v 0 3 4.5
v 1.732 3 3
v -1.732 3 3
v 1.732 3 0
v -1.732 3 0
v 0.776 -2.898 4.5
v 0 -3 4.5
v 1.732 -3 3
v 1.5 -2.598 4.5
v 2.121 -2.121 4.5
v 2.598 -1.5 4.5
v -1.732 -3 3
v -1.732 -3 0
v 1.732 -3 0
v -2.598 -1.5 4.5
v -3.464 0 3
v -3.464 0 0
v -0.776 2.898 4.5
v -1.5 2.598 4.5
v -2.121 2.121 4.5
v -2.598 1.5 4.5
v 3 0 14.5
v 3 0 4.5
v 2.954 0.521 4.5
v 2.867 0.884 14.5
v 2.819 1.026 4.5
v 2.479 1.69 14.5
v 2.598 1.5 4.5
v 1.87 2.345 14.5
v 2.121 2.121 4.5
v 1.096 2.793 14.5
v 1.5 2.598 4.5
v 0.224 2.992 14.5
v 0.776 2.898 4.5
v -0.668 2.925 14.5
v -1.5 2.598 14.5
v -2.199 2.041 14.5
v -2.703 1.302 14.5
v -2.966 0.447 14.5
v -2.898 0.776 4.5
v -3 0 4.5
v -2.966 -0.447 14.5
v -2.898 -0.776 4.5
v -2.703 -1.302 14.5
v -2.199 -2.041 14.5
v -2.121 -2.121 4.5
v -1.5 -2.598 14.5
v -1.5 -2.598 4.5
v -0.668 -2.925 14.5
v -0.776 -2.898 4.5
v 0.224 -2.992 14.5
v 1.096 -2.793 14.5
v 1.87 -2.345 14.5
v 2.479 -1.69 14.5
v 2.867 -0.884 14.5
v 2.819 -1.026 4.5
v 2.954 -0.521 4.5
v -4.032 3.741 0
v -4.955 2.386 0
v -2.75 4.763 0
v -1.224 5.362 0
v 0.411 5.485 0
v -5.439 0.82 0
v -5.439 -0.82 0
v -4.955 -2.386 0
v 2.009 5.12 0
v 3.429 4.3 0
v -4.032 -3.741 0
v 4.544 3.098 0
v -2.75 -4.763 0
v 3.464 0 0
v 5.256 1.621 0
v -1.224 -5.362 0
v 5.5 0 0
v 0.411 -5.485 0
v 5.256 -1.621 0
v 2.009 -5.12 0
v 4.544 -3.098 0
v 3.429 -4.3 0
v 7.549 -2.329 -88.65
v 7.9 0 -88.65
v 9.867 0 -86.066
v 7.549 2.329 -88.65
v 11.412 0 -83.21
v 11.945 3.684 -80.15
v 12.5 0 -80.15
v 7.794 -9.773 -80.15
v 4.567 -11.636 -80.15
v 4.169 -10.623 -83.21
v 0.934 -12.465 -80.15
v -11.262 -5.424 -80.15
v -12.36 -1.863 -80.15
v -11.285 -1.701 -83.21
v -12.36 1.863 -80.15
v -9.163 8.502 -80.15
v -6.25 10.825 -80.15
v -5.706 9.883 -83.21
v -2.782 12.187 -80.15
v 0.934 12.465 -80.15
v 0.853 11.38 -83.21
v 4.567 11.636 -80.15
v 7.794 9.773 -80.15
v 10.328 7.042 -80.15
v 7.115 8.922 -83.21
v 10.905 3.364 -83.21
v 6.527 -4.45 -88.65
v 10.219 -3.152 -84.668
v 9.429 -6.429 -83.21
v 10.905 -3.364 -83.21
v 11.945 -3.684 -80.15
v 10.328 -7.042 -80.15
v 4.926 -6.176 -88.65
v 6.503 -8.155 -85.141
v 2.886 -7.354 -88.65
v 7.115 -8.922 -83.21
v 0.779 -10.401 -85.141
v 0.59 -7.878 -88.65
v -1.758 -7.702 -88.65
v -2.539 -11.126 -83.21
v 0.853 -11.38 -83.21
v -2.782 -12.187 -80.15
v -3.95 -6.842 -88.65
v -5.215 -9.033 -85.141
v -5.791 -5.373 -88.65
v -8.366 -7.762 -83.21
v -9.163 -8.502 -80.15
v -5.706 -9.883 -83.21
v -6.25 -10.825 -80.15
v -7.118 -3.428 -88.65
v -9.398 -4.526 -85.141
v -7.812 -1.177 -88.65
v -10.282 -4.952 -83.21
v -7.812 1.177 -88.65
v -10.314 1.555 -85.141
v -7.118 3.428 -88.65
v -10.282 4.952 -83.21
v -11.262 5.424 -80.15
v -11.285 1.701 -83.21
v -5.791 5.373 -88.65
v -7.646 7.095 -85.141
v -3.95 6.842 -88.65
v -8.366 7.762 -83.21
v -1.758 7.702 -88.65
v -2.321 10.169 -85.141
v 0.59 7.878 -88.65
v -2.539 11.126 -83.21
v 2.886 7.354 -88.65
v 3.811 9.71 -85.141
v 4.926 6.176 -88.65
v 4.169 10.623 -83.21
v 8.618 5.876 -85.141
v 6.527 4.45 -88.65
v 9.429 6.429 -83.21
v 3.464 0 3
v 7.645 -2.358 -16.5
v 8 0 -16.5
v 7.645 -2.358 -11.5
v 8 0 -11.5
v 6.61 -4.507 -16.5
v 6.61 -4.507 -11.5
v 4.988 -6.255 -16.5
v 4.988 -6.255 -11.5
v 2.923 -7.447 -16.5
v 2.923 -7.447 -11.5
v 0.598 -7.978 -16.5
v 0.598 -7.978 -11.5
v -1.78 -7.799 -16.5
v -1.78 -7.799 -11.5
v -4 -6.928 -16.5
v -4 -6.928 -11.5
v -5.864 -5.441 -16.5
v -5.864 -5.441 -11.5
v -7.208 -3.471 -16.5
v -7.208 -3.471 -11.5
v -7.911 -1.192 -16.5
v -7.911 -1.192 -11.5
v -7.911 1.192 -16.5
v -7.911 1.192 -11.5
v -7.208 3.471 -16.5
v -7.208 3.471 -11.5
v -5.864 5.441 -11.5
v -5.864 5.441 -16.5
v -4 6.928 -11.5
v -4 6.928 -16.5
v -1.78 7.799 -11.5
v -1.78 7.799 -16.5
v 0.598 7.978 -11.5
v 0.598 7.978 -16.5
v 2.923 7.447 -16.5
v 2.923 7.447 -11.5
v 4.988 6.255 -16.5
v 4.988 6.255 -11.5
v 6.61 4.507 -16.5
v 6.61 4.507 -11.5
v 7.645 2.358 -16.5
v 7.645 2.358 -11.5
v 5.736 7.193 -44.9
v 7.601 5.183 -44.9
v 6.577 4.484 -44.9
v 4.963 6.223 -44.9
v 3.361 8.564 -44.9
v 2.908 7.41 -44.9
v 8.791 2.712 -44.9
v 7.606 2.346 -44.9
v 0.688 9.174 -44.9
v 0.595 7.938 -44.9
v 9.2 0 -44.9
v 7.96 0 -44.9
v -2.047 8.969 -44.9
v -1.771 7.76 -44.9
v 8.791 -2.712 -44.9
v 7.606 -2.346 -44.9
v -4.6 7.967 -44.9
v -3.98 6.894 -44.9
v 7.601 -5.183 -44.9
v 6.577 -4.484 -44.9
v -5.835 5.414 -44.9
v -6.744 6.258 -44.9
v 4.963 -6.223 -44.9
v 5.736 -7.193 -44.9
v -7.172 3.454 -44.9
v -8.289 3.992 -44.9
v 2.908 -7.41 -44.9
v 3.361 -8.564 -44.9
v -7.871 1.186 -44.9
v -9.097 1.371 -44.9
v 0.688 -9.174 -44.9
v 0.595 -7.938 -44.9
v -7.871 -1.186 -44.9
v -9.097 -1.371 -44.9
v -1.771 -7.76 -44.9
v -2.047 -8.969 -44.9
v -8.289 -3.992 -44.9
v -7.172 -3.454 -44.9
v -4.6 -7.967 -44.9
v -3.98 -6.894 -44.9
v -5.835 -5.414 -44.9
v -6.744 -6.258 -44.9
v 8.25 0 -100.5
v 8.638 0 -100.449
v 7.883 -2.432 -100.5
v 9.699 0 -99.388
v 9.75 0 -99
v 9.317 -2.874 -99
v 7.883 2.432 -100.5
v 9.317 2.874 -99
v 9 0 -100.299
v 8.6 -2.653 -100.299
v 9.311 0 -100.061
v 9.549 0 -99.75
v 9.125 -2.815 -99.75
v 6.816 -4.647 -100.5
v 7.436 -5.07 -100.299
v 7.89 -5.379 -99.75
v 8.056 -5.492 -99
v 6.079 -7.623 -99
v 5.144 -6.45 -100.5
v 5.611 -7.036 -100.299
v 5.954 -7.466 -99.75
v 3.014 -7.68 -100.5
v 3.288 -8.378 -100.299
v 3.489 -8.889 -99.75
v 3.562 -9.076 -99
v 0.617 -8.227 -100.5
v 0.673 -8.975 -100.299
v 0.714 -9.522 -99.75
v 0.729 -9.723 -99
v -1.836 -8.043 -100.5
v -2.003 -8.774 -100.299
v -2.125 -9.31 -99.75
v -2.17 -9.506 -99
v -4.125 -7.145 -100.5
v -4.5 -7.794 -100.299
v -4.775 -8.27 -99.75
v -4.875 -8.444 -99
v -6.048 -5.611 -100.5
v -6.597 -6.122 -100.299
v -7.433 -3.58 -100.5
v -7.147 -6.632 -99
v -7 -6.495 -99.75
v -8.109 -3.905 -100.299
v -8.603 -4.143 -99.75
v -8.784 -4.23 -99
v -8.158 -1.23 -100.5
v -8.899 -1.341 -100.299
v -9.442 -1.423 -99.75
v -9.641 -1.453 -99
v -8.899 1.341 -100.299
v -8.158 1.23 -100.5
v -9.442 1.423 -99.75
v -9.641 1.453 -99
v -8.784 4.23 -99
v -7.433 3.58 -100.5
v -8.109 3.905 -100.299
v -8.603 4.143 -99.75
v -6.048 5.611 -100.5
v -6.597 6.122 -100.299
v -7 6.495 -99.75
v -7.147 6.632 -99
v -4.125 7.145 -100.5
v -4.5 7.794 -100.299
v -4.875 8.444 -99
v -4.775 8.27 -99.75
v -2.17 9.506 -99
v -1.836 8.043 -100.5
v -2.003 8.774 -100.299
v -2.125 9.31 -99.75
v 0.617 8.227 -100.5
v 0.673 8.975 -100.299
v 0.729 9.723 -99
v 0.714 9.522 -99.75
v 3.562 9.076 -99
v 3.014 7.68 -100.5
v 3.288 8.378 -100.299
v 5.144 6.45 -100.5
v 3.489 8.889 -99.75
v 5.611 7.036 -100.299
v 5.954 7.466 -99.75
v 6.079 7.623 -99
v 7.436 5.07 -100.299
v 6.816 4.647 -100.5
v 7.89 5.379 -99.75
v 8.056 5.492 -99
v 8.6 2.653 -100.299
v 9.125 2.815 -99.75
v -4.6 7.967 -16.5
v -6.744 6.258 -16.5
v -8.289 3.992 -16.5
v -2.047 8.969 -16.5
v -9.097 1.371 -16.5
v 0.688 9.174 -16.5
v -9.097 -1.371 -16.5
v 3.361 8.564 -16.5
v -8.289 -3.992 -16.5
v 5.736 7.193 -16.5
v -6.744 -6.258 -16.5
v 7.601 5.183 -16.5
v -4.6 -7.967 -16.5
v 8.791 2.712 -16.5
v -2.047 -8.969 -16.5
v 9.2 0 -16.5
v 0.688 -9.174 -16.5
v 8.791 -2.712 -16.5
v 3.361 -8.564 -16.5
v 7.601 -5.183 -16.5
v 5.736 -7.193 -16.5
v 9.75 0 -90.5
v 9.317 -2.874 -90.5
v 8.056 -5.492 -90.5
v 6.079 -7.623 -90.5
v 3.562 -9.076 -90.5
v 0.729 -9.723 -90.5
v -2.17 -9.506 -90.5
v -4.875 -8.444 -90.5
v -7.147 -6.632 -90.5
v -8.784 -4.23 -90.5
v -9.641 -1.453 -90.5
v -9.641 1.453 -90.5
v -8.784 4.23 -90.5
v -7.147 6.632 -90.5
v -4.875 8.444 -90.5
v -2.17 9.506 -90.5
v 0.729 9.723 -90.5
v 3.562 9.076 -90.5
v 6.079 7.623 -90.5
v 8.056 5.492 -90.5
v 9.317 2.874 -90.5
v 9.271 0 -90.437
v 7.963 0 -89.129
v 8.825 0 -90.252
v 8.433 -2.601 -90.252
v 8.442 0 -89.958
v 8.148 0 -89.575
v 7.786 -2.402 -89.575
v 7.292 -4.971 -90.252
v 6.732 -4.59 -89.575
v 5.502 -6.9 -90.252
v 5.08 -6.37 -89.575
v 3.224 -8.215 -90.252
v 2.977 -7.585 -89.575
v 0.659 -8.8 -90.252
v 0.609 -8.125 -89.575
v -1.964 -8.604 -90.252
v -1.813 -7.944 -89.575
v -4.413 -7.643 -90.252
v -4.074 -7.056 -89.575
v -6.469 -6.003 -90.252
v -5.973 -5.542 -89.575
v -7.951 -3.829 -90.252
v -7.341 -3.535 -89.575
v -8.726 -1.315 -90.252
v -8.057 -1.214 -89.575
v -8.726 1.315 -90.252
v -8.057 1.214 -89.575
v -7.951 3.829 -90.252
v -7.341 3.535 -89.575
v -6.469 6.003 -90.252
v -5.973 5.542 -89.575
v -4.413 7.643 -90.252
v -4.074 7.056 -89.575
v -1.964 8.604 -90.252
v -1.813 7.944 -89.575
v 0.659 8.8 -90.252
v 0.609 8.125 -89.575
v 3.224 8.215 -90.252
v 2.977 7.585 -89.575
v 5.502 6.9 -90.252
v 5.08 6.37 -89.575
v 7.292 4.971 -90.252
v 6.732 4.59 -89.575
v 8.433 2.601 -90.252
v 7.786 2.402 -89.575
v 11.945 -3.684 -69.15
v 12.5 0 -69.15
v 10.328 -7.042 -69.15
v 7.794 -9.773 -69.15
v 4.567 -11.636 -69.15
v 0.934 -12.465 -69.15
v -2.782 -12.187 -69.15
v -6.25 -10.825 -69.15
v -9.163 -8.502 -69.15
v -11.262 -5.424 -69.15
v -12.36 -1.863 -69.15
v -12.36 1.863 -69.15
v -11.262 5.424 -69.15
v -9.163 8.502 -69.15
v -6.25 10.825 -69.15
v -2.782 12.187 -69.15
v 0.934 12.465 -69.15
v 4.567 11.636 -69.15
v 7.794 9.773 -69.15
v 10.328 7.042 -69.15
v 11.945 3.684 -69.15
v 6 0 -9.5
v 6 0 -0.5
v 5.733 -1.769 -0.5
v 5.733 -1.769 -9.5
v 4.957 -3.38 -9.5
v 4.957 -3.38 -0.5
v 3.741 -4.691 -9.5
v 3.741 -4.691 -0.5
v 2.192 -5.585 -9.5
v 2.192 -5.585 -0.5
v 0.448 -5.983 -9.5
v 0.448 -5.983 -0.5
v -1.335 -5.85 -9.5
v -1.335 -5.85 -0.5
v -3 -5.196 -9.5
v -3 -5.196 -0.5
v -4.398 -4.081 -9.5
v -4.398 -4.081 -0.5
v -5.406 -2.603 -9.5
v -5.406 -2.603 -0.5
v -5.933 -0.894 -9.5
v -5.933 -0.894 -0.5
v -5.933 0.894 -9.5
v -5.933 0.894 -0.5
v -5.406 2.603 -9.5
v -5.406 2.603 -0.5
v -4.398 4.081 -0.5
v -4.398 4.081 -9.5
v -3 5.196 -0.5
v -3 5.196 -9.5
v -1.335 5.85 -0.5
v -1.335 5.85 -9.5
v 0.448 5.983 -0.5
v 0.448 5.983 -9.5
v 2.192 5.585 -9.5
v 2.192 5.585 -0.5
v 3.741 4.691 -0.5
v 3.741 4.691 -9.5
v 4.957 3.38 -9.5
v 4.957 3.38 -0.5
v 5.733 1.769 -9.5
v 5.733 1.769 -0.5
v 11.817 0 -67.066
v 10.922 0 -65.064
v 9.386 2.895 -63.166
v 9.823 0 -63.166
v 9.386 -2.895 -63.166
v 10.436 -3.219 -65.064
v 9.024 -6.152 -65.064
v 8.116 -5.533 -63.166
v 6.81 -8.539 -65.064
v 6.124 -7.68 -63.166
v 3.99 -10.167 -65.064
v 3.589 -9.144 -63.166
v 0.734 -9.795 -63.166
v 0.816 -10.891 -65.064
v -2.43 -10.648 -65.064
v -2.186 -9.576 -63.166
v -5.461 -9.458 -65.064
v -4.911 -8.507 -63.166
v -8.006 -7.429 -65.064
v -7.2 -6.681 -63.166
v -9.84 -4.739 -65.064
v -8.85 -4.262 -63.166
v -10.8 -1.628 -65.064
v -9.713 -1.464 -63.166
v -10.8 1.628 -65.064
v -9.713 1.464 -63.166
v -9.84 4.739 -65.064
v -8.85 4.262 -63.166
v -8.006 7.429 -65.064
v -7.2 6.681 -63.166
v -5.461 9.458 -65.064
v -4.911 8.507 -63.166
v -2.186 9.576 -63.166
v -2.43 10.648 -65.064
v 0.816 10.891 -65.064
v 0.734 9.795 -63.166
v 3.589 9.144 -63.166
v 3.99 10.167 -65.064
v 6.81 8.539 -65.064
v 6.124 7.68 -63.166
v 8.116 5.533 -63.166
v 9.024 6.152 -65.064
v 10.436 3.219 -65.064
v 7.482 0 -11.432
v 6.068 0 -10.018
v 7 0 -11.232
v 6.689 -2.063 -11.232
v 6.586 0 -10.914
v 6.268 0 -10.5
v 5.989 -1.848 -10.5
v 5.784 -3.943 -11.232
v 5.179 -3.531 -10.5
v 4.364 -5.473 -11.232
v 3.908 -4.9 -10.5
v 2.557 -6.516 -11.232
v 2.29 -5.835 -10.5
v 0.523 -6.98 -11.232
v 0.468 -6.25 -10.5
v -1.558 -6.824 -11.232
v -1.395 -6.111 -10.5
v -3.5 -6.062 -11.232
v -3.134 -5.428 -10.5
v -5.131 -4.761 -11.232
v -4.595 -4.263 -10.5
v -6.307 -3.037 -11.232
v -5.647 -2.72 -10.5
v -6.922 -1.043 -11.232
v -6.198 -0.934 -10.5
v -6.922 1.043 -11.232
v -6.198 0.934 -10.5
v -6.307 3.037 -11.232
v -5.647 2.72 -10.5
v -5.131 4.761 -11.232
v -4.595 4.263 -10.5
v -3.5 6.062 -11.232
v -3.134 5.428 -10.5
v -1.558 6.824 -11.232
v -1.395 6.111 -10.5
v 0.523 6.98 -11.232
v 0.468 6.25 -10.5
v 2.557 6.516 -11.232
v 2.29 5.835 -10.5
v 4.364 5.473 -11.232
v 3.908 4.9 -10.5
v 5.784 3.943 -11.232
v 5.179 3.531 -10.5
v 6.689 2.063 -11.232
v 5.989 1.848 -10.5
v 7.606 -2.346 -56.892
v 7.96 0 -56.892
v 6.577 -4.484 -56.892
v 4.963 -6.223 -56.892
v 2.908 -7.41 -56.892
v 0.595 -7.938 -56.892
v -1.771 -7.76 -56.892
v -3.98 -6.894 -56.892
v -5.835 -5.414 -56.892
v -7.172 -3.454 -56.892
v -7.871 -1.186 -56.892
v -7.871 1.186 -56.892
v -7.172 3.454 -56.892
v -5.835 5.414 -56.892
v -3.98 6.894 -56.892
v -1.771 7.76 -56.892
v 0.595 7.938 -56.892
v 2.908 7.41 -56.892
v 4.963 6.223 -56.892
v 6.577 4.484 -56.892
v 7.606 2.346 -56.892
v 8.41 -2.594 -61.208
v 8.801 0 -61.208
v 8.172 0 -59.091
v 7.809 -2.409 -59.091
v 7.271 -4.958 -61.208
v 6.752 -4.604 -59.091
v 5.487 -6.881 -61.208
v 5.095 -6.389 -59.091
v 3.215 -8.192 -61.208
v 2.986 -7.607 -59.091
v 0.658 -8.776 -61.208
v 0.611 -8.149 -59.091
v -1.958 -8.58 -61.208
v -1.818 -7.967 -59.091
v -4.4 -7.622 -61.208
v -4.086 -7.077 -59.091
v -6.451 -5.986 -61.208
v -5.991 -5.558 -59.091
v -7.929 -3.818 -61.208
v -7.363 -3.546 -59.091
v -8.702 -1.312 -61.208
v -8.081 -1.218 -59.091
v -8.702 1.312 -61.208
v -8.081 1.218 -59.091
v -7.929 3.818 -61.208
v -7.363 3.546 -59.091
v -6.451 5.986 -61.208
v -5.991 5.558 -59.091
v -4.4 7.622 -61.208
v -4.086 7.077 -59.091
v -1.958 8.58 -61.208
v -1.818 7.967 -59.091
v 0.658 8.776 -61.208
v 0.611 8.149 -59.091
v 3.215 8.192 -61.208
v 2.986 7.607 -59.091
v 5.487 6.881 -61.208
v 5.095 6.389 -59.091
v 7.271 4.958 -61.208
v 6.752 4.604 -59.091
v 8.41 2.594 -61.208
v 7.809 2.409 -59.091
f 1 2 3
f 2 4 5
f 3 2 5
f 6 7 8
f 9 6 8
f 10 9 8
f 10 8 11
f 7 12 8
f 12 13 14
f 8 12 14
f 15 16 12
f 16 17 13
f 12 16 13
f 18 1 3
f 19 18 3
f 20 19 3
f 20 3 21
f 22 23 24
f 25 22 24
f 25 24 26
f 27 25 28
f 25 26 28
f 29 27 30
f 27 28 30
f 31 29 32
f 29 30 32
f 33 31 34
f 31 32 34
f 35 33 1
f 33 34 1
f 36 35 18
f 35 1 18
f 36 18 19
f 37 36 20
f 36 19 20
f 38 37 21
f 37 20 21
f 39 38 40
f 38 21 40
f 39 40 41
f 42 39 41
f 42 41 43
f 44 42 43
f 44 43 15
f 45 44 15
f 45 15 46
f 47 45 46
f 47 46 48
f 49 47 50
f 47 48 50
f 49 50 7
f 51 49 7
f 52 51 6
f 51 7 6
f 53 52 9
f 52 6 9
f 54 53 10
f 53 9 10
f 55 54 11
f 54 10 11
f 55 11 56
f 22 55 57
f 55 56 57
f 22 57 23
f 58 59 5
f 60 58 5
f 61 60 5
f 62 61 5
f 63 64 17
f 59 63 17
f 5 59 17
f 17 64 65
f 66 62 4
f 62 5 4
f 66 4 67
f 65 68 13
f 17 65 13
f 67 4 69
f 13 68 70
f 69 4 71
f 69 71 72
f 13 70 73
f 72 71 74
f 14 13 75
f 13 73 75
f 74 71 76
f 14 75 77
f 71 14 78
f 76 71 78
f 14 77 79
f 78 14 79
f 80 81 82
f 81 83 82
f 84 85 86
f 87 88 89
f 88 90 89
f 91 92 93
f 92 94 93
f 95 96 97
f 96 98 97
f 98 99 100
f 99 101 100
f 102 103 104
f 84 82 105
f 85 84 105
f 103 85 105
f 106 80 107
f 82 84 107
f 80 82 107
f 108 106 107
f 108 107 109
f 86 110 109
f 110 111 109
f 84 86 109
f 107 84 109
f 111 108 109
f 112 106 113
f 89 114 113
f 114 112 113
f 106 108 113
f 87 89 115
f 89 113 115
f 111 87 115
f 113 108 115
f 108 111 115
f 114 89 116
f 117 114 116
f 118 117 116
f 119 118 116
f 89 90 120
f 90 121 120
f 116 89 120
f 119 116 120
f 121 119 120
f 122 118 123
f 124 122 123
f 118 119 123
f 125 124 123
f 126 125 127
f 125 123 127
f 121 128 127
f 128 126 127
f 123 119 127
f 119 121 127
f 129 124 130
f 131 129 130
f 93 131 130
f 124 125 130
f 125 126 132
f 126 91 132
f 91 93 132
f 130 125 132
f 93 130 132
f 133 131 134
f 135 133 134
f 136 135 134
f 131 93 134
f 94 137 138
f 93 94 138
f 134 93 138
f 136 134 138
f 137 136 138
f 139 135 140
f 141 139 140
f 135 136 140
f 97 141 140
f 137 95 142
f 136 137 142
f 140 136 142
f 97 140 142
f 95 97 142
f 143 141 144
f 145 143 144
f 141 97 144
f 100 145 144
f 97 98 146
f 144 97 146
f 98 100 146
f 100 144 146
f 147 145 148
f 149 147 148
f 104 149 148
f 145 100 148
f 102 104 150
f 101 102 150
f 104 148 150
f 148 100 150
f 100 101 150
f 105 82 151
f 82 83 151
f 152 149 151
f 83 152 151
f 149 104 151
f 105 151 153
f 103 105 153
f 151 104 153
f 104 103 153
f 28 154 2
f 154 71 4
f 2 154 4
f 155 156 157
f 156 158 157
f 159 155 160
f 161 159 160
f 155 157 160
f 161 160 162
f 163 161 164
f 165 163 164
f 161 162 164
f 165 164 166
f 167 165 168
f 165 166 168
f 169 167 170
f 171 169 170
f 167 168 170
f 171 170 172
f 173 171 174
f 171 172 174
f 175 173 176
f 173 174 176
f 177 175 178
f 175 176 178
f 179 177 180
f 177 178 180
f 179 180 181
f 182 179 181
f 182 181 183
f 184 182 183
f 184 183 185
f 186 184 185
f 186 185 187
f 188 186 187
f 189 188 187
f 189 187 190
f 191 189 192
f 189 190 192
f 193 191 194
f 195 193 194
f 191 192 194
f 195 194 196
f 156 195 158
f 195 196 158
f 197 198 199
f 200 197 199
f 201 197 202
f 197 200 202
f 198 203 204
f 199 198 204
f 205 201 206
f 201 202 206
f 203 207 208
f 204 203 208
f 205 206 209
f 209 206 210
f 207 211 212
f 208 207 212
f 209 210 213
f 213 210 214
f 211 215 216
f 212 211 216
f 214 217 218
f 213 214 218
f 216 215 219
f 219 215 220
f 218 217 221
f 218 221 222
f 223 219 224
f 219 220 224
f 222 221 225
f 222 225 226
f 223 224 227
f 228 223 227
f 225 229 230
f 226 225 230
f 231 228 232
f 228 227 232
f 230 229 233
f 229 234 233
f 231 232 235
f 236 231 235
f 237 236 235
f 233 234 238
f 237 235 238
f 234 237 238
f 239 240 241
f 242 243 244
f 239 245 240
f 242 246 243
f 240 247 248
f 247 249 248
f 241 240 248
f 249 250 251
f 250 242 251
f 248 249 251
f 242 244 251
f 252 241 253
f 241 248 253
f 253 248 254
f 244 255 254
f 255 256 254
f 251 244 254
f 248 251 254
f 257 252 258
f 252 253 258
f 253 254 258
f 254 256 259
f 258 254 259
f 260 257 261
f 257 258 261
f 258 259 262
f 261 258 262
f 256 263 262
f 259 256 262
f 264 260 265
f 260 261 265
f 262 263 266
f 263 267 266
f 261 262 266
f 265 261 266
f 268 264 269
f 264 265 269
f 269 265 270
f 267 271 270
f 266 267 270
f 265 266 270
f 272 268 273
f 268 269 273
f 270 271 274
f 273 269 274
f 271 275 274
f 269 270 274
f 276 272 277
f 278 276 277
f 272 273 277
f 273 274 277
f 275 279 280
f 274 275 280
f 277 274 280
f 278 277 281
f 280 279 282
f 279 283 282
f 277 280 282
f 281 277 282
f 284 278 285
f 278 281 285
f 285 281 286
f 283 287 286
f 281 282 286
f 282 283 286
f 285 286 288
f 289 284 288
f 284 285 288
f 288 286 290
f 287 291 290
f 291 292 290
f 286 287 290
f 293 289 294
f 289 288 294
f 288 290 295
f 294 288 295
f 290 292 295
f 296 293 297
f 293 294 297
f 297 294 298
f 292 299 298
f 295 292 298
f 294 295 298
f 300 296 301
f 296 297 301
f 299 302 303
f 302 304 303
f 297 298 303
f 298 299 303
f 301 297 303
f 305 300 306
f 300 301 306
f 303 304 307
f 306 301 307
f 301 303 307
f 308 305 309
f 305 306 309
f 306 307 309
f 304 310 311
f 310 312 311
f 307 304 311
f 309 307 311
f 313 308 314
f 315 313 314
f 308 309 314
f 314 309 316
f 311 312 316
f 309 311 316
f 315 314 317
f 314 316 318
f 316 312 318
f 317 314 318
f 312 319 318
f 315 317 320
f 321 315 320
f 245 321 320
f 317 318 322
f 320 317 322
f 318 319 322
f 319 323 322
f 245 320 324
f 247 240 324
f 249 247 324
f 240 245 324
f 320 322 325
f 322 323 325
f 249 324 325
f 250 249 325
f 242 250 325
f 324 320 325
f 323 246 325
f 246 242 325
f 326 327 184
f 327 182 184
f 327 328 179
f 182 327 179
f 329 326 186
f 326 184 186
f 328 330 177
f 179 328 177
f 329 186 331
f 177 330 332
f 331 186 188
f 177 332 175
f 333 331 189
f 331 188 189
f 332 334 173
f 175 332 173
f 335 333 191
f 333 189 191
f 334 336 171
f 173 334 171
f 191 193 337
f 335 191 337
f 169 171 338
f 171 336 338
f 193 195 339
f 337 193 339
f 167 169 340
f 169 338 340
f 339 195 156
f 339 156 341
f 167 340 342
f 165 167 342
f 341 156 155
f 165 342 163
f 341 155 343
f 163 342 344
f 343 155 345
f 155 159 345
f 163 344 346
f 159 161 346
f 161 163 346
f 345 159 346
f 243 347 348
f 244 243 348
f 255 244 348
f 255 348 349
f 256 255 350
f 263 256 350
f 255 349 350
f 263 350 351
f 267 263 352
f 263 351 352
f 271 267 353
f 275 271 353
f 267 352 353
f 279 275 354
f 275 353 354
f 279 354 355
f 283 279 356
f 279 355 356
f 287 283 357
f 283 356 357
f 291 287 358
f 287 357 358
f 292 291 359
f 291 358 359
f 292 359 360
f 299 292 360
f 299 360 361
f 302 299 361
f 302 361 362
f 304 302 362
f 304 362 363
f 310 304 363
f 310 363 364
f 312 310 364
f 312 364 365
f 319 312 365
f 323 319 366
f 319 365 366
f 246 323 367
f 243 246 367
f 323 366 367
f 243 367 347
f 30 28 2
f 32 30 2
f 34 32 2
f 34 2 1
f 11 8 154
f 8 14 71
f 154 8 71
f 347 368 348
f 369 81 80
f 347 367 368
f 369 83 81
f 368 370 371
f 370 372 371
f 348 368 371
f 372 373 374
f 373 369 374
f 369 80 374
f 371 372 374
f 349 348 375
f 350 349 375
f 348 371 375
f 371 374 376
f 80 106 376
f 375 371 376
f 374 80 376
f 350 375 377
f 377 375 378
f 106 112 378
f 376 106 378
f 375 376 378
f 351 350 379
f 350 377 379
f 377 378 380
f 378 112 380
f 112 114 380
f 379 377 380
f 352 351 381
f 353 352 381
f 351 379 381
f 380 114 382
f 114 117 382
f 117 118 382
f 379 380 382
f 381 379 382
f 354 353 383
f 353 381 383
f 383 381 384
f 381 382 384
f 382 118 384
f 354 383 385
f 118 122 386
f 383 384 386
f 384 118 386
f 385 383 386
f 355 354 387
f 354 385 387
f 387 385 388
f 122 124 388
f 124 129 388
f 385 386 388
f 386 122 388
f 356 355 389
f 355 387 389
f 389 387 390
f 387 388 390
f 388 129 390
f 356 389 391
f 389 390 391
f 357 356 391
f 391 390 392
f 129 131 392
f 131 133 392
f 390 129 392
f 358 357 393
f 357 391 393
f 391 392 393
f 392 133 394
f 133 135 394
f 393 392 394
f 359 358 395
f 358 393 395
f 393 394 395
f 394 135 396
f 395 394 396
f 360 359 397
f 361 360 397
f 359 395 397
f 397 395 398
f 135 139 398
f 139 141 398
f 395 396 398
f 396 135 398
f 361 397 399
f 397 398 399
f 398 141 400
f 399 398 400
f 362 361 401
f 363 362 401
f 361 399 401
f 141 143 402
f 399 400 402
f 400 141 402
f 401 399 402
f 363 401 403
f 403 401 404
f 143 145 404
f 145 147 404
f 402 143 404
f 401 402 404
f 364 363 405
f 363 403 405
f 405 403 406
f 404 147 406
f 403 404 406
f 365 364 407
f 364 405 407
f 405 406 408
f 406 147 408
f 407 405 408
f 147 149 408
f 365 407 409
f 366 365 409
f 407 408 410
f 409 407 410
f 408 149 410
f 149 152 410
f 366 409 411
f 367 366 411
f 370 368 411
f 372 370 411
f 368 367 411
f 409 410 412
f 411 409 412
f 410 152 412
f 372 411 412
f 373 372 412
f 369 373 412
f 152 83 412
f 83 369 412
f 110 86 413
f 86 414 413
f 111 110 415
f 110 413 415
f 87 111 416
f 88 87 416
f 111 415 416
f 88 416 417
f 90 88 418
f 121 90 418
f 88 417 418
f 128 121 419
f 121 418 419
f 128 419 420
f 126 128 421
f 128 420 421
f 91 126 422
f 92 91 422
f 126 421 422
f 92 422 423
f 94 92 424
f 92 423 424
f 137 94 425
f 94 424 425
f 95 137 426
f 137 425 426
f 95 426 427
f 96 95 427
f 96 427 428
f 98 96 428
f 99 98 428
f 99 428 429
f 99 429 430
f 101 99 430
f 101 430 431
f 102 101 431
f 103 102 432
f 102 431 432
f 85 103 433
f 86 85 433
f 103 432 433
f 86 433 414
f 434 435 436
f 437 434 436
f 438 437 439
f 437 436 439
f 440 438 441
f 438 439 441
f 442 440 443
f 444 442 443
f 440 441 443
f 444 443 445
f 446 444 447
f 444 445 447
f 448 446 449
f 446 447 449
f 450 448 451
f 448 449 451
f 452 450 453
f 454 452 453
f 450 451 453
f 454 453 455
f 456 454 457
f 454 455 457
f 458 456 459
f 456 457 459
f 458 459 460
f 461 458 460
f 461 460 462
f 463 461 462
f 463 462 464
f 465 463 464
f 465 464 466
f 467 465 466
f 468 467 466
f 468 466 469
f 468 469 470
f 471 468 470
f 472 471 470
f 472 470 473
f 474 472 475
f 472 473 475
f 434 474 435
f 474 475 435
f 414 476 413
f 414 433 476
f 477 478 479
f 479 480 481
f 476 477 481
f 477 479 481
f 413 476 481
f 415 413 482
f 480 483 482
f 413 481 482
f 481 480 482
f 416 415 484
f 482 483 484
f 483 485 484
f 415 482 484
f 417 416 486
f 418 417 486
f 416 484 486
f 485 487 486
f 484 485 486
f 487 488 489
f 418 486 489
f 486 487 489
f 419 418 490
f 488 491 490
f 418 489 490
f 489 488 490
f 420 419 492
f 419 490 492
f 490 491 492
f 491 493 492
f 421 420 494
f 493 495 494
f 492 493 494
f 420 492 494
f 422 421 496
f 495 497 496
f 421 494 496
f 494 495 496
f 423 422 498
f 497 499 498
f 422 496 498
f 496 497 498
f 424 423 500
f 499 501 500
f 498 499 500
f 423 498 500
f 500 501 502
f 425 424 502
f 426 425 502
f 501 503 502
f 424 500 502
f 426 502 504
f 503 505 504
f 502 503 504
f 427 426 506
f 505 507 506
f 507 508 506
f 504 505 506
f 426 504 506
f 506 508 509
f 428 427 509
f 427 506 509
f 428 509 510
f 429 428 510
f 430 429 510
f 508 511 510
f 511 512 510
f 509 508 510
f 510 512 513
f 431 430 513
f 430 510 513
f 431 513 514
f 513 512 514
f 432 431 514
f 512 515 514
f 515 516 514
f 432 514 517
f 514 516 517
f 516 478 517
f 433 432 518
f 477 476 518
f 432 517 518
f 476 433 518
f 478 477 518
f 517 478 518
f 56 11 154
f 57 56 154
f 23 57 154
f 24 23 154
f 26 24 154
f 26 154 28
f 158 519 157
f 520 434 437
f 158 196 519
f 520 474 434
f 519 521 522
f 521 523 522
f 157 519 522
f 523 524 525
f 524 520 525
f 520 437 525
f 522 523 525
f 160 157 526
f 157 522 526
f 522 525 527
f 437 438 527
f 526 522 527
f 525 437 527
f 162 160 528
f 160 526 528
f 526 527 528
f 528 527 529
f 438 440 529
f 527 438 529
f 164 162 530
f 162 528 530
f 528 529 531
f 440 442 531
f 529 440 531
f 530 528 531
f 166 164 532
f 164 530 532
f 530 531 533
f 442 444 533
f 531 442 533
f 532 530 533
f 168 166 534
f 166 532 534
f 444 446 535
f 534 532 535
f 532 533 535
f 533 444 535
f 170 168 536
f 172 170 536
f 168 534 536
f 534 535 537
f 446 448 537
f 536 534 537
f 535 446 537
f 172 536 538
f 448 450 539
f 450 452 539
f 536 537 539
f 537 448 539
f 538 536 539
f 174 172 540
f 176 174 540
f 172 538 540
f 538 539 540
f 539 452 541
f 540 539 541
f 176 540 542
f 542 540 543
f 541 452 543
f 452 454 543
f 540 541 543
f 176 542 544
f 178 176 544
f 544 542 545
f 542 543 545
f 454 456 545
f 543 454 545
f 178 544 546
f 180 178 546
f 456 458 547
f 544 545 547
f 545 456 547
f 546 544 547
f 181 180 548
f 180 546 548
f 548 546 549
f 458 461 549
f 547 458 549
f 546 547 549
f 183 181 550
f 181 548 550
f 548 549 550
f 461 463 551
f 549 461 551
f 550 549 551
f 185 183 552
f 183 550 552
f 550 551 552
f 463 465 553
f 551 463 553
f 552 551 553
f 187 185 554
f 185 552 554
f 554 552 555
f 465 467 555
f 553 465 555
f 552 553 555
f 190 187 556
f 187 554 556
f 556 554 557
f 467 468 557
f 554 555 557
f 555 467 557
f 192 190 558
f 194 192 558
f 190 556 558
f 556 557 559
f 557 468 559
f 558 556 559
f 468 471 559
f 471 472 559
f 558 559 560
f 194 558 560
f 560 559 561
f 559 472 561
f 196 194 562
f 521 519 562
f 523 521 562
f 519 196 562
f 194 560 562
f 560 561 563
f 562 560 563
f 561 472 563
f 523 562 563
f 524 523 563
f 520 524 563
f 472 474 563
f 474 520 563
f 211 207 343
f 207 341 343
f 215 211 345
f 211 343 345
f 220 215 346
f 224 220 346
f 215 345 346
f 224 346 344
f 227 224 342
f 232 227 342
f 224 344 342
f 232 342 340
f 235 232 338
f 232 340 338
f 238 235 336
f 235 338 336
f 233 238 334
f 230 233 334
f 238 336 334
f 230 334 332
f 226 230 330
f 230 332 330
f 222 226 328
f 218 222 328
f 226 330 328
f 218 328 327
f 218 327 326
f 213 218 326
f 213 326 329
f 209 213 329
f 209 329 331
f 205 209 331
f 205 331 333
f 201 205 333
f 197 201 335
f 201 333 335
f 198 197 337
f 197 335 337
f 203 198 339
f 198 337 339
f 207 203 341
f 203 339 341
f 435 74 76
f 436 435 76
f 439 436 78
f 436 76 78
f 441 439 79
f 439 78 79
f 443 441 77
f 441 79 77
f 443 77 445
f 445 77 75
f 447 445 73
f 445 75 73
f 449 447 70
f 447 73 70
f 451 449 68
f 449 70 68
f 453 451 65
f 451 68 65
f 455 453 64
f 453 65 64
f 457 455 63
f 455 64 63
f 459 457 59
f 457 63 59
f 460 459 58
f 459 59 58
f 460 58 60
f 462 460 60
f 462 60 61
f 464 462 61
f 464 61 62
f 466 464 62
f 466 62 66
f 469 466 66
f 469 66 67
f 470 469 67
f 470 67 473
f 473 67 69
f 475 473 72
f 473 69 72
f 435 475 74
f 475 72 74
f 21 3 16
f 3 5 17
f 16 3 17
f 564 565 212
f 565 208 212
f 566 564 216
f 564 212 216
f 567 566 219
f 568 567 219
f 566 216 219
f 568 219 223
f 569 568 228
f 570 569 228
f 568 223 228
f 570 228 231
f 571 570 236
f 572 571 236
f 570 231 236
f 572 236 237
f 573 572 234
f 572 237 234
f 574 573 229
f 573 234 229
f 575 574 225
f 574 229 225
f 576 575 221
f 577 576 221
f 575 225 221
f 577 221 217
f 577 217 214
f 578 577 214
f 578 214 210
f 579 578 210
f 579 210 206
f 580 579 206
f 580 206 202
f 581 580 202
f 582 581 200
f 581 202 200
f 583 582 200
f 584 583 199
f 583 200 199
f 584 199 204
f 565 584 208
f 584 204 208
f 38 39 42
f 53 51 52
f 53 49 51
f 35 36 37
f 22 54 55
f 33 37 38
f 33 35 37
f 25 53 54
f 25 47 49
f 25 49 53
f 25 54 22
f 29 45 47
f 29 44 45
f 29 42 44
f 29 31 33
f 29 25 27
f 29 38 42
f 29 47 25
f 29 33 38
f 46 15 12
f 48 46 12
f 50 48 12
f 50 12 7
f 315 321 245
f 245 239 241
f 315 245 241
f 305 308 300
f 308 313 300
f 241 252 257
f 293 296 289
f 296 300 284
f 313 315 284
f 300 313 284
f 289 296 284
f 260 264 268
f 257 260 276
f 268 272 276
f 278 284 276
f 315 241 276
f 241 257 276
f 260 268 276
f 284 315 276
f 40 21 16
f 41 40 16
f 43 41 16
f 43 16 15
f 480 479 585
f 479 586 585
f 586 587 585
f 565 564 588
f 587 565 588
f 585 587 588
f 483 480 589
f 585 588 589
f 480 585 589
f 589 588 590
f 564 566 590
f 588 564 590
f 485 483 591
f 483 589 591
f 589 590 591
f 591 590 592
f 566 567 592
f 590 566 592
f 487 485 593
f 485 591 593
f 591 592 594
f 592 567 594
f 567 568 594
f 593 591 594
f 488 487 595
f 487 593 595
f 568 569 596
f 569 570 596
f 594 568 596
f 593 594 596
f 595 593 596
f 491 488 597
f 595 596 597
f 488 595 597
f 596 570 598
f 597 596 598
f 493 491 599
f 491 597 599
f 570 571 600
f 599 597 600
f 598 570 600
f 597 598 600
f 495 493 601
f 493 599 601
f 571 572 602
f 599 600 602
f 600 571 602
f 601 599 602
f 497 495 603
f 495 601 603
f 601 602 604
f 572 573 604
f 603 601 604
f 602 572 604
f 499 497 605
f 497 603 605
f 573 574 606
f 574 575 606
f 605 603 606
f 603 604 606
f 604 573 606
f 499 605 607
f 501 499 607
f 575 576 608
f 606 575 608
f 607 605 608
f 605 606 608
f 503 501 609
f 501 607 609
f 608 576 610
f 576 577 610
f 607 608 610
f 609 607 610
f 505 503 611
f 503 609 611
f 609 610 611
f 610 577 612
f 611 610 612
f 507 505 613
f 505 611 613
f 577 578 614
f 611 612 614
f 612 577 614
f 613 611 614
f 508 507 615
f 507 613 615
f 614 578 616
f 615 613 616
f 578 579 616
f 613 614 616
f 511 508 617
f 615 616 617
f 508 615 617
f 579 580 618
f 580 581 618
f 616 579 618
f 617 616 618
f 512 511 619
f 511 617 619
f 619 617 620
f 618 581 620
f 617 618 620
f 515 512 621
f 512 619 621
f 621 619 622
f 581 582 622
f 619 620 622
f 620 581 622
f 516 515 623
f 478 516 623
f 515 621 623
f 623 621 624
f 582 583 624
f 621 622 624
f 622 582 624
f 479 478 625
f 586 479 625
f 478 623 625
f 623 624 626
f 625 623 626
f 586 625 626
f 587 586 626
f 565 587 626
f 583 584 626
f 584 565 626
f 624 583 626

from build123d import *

# Parameters (mm, degrees)
FILLET1_R           = 1.5
CHAMFER1_SIZE       = 0.5
BOSS_EXTRUDE1_DEPTH = 14.5


with BuildPart() as part:
    # Sketch1 → Revolve1 (revolve)
    with BuildSketch(Plane(origin=(0, 0, 0), x_dir=(1, 0, 0), z_dir=(0, 1, 0))):
        with BuildLine():
            Line((0, 0), (0, 100.5))
            Line((0, 100.5), (9.75, 100.5))
            Line((9.75, 100.5), (9.75, 90.5))
            ThreePointArc((9.75, 90.5), (8.441852455, 89.958147545), (7.9, 88.65))
            ThreePointArc((7.9, 88.65), (10.694495807, 84.667609495), (12.5, 80.15))
            Line((12.5, 80.15), (12.5, 69.15))
            ThreePointArc((12.5, 69.15), (11.395638202, 66.053286337), (9.822505168, 63.166332415))
            ThreePointArc((9.822505168, 63.166332415), (8.435454872, 60.164407444), (7.96, 56.89188476))
            Line((7.96, 56.89188476), (7.96, 44.9))
            Line((7.96, 44.9), (9.2, 44.9))
            Line((9.2, 44.9), (9.2, 16.5))
            Line((9.2, 16.5), (8, 16.5))
            Line((8, 16.5), (8, 11.5))
            ThreePointArc((8, 11.5), (6.585786438, 10.914213562), (6, 9.5))
            Line((6, 9.5), (6, 0))
            Line((6, 0), (0, 0))
        make_face()
    revolve(axis=Axis((0, 0, 0), (0, 0, -1)))

    # Fillet1
    fillet1_edges = [part.edges().sort_by_distance(p)[0] for p in [
        (-9.75, 0, -100.5),
    ]]
    fillet(fillet1_edges, radius=FILLET1_R)

    # Chamfer1
    chamfer1_edges = [part.edges().sort_by_distance(p)[0] for p in [
        (-6, 0, 0),
    ]]
    chamfer(chamfer1_edges, length=CHAMFER1_SIZE)

    # Sketch2 → Boss-Extrude1 (add)
    with BuildSketch(Plane.XY):
        Polygon((1.732050808, 3), (-1.732050808, 3), (-3.464101615, 0), (-1.732050808, -3), (1.732050808, -3), (3.464101615, 0), align=None)
    extrude(amount=BOSS_EXTRUDE1_DEPTH)

    # Sketch3 → Cut-Revolve1 (revolve, cut)
    with BuildSketch(Plane(origin=(0, 0, 0), x_dir=(1, 0, 0), z_dir=(0, 1, 0))):
        with BuildLine():
            Line((3, -14.5), (3, -4.5))
            ThreePointArc((3, -4.5), (3.1186767, -3.714921929), (3.464101615, -3))
            Line((3.464101615, -3), (3.464101615, -14.5))
            Line((3.464101615, -14.5), (3, -14.5))
        make_face()
    revolve(axis=Axis((0, 0, 0), (0, 0, 1)), mode=Mode.SUBTRACT)


solid = part.part
